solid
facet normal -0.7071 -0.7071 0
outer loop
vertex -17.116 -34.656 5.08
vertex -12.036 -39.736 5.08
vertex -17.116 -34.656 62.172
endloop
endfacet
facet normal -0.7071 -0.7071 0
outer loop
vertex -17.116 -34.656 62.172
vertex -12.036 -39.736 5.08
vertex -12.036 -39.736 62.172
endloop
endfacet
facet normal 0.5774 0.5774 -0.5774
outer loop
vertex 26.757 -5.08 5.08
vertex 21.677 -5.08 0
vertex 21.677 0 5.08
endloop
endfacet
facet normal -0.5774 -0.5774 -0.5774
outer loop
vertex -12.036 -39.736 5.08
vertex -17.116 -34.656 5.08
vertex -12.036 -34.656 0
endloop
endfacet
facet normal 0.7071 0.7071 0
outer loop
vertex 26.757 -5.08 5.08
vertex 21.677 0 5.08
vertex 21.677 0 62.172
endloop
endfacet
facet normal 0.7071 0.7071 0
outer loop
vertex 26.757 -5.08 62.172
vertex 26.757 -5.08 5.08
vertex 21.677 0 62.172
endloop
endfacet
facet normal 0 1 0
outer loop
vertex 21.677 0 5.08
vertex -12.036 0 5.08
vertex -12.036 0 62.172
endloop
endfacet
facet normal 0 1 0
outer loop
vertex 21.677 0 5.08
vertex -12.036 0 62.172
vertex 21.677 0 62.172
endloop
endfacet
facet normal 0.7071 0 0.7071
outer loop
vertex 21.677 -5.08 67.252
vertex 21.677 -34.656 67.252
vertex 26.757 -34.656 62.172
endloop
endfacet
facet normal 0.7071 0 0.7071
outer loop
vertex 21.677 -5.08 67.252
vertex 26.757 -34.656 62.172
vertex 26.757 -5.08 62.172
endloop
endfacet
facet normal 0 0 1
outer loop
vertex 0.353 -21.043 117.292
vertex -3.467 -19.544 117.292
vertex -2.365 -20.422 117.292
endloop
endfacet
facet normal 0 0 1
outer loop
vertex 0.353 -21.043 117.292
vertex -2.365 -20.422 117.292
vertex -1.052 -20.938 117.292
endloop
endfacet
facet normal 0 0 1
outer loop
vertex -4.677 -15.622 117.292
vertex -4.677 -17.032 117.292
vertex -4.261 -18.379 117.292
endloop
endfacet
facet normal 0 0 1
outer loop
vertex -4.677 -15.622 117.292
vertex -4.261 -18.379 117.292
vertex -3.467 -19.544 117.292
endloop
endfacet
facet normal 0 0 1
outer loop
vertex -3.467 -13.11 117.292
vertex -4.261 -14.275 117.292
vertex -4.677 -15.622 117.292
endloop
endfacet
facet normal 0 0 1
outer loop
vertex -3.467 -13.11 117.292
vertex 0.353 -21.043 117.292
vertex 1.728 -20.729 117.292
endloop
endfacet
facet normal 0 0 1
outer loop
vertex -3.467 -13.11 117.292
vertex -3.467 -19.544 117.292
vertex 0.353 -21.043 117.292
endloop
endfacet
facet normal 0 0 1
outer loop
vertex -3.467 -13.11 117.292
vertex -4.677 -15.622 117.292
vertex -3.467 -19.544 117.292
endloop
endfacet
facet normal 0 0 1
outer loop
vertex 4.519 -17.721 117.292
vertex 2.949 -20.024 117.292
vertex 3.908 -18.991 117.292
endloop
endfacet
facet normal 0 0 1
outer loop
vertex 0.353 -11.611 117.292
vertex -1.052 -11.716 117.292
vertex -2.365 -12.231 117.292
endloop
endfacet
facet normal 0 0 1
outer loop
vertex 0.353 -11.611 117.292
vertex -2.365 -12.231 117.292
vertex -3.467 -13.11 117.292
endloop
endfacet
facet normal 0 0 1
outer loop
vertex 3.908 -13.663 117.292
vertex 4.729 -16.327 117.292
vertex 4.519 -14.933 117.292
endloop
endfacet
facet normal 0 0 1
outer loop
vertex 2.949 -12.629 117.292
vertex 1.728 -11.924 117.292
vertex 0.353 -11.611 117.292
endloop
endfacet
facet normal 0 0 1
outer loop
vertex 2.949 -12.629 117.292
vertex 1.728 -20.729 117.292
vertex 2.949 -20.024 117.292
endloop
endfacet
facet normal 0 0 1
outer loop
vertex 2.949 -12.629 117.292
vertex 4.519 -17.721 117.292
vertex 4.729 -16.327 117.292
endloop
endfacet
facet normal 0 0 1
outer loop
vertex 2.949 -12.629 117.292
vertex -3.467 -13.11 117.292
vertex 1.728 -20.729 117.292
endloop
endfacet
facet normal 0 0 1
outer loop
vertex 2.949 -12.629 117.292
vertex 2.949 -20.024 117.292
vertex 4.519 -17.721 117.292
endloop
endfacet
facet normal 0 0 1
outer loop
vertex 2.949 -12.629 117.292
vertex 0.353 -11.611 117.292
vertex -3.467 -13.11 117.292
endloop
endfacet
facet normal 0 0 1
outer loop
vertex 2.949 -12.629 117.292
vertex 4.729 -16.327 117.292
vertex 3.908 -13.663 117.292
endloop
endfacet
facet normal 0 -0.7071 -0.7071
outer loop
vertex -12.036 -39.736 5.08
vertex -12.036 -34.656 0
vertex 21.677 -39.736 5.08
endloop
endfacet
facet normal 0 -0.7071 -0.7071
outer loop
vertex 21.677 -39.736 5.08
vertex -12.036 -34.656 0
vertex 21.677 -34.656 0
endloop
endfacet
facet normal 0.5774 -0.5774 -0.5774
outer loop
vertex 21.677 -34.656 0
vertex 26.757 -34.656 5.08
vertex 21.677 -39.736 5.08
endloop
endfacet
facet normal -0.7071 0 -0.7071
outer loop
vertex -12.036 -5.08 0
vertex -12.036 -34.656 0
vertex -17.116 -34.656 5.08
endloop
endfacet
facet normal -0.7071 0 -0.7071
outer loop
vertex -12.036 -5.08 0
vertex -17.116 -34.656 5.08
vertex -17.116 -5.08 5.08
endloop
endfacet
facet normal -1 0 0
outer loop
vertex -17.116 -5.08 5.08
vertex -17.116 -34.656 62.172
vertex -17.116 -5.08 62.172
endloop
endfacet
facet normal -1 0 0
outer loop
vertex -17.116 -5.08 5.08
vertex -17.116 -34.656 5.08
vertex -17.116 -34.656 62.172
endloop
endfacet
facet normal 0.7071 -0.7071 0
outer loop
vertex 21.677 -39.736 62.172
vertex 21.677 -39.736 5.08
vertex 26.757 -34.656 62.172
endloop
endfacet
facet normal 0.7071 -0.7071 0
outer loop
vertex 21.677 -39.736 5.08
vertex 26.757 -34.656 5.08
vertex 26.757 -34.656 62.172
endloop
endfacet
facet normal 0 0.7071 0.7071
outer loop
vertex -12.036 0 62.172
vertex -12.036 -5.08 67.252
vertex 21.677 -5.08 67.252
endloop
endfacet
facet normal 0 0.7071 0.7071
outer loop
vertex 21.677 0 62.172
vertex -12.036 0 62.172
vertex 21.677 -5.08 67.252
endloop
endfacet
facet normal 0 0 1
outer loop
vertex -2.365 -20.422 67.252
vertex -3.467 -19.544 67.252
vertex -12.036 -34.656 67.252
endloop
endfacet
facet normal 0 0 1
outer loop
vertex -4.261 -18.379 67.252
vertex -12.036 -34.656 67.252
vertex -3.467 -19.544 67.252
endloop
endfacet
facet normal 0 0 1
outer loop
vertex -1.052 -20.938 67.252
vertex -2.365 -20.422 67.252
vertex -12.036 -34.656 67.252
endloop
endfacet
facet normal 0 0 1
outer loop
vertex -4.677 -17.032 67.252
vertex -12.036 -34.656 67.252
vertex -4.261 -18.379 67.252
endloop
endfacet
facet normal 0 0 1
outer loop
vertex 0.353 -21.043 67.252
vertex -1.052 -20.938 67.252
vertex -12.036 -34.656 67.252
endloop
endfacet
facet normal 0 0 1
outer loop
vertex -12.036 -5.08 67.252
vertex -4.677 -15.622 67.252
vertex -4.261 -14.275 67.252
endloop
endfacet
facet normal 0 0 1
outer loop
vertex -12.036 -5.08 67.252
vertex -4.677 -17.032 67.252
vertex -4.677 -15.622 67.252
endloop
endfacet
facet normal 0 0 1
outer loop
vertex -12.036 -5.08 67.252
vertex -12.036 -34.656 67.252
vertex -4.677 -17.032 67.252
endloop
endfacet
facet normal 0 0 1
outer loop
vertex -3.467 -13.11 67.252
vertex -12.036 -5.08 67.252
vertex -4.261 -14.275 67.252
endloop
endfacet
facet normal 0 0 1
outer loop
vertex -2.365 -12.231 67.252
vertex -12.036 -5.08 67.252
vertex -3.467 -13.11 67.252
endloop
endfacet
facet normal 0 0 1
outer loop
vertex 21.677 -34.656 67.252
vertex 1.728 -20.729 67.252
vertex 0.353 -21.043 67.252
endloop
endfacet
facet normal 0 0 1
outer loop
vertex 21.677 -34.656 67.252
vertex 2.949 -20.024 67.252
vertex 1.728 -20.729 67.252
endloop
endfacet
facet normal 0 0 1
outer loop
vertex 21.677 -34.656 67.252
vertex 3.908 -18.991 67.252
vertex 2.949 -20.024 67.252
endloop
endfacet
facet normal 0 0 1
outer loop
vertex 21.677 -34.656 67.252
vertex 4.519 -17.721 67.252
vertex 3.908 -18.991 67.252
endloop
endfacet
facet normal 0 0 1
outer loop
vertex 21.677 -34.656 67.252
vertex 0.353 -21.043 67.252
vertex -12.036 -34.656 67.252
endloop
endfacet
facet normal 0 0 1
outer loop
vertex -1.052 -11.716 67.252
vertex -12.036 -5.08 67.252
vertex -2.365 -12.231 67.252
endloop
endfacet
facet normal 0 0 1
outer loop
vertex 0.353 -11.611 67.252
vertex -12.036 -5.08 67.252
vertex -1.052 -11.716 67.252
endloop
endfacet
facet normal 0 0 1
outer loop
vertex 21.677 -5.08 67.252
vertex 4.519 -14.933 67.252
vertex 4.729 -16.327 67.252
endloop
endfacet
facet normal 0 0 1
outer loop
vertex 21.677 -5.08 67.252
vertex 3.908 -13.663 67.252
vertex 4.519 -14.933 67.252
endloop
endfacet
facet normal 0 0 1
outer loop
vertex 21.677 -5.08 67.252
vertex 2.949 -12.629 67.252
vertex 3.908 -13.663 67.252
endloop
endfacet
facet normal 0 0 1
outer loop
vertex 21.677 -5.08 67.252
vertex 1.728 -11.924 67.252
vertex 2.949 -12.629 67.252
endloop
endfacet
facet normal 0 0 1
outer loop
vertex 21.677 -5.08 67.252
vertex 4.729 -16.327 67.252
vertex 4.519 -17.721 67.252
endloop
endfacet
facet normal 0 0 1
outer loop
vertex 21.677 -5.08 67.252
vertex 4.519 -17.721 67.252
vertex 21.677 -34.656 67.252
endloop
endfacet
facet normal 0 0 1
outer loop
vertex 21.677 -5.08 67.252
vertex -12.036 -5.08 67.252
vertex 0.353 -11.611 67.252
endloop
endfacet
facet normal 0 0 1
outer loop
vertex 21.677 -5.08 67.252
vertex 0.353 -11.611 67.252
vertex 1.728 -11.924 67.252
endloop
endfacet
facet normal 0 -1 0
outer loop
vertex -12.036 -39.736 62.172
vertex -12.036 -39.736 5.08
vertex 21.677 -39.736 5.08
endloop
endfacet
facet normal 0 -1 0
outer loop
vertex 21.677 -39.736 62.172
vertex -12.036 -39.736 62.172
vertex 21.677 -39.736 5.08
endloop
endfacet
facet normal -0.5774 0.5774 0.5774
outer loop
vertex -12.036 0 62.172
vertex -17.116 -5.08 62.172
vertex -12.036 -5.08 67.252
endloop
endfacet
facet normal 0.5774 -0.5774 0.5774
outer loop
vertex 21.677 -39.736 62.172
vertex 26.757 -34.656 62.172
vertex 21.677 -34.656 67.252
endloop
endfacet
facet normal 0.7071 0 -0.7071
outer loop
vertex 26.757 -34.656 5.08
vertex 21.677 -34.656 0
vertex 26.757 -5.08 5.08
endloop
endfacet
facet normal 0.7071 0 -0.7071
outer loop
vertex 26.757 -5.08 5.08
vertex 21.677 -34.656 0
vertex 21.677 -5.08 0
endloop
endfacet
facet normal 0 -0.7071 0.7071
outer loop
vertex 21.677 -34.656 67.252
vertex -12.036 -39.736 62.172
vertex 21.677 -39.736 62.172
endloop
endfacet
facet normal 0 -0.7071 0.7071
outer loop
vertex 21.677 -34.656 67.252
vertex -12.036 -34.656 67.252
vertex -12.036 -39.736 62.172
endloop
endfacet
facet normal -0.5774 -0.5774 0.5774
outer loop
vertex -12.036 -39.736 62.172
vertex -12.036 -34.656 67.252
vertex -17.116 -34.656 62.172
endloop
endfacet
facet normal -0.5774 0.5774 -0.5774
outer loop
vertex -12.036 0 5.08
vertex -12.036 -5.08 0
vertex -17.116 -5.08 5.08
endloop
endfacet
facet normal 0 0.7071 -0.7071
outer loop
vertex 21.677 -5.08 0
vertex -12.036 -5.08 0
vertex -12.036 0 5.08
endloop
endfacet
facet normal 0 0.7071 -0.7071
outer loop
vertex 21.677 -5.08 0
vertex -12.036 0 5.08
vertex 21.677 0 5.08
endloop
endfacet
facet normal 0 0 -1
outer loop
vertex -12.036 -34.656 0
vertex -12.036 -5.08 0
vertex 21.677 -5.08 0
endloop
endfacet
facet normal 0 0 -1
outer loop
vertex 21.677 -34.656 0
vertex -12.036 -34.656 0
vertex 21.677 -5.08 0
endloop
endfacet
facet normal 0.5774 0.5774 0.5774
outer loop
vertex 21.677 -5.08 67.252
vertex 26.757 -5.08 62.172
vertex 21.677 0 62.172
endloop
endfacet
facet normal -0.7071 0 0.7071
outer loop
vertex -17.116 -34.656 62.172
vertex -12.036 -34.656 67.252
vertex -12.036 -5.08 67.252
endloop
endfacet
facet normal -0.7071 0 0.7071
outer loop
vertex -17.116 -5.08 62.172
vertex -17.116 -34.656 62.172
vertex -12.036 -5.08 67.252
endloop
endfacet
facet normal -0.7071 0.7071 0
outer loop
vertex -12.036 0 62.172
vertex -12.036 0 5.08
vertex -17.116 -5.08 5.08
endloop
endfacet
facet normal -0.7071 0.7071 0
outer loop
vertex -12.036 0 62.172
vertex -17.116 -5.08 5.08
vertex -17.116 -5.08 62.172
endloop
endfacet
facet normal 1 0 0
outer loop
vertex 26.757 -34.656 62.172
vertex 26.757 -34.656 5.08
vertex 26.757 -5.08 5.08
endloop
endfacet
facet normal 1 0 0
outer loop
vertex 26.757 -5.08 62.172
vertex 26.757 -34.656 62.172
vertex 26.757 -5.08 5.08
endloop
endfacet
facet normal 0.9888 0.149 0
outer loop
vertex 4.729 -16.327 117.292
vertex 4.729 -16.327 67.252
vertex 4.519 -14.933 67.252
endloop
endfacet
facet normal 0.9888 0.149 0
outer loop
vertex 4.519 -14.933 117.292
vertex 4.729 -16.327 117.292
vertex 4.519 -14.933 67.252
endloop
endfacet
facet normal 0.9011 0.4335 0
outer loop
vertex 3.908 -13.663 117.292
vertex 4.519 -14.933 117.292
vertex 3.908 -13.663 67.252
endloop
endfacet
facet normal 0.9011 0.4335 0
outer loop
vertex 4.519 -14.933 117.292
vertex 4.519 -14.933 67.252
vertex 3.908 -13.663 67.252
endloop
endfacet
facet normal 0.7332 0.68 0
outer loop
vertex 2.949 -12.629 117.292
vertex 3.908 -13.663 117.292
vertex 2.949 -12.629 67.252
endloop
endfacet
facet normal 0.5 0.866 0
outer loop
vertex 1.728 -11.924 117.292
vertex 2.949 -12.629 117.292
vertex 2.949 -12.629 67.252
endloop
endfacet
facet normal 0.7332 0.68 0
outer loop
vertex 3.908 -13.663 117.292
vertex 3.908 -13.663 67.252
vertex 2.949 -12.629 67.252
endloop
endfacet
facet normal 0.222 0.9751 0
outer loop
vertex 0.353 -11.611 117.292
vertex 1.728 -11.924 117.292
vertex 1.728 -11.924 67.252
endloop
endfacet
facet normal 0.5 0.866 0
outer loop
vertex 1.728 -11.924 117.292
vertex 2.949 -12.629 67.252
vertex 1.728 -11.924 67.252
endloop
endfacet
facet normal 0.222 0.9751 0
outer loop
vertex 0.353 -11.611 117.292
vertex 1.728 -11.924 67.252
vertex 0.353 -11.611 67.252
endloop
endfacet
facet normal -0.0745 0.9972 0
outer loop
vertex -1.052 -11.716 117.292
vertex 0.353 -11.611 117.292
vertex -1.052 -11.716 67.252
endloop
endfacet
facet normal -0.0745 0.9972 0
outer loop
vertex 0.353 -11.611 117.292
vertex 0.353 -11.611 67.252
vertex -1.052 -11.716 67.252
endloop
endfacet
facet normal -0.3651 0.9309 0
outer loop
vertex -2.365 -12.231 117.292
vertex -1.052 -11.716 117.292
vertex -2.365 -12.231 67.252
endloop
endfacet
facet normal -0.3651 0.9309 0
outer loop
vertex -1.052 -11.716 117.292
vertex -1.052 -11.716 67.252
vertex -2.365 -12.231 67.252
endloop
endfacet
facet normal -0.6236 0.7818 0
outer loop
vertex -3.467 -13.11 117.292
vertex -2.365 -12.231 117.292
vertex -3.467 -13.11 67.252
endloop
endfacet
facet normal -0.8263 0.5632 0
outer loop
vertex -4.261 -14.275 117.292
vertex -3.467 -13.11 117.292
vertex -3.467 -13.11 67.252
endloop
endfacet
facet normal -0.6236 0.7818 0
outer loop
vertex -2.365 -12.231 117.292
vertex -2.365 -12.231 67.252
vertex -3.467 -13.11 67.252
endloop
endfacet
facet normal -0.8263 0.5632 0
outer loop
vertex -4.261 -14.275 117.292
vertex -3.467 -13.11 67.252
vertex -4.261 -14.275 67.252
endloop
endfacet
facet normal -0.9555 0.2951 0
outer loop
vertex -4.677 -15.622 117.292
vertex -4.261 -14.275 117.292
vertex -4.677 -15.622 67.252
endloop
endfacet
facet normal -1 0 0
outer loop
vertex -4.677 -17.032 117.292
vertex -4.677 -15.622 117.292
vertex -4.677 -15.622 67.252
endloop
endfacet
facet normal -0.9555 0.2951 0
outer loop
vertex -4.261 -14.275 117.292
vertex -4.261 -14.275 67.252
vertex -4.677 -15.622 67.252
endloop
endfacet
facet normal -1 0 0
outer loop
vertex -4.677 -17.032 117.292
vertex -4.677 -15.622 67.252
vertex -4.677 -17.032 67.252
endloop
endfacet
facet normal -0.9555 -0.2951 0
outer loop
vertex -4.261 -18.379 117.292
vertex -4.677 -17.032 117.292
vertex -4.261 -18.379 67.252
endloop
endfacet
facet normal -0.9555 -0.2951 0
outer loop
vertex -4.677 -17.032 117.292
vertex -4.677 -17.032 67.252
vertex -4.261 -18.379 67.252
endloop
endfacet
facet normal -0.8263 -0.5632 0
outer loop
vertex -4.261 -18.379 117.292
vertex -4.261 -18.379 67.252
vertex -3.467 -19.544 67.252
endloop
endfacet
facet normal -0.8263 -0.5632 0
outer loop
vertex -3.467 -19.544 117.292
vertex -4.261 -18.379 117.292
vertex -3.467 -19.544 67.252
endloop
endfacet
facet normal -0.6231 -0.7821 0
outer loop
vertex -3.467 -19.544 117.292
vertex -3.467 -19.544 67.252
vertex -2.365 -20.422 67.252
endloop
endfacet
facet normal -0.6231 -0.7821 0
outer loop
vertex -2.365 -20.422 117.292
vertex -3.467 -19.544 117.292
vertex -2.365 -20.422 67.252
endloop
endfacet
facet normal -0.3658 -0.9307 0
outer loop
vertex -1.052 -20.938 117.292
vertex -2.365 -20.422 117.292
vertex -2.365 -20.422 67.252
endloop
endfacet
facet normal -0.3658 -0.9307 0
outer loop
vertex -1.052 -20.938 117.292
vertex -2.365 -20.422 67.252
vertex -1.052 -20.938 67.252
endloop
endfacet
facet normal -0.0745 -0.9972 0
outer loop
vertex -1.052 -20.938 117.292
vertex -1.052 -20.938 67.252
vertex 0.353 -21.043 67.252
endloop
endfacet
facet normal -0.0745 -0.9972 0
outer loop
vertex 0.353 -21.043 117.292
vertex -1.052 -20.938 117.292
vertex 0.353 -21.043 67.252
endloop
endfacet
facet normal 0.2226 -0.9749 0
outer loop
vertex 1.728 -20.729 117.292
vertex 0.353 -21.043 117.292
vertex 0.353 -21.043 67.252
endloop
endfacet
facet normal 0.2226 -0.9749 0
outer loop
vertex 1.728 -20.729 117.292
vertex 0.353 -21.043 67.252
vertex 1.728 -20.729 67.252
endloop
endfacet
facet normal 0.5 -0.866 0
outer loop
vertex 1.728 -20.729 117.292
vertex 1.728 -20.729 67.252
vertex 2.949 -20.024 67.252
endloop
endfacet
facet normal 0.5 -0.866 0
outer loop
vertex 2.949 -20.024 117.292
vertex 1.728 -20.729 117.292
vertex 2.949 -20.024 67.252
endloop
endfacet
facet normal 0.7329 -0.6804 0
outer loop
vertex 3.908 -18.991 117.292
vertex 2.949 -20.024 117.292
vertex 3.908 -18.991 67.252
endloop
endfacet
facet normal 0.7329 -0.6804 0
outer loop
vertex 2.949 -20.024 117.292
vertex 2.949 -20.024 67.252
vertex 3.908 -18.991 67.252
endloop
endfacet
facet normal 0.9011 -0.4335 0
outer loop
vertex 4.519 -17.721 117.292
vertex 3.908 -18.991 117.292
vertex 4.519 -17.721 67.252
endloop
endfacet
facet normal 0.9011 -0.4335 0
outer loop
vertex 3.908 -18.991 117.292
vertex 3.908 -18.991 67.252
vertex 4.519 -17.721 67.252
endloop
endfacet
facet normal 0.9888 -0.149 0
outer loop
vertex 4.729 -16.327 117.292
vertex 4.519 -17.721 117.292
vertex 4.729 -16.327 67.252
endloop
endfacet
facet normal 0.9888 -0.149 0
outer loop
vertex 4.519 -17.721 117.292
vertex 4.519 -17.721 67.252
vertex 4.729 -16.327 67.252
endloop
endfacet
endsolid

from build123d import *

# Parameters (mm, degrees)
F0_W     = 43.873566
F0_H     = 39.735638
F1_DEPTH = 67.251692
F2_SIZE  = 5.08
F3_R     = 4.729386
F4_DEPTH = 50.0404


with BuildPart() as f1:
    # F0 (on Top) → F1 (new body)
    with BuildSketch(Plane.XY):
        with Locations((4.820467, -19.867819)):
            Rectangle(F0_W, F0_H)
    extrude(amount=F1_DEPTH)

    # F2
    f2_edges = [f1.edges().sort_by_distance(p)[0] for p in [
        (26.75725, -39.735638, 33.625846),
        (26.75725, -19.867819, 67.251692),
        (4.820467, -39.735638, 67.251692),
        (-17.116316, -19.867819, 67.251692),
        (-17.116316, -39.735638, 33.625846),
        (-17.116316, -19.867819, 0),
        (26.75725, -19.867819, 0),
        (4.820467, 0, 0),
        (26.75725, 0, 33.625846),
        (-17.116316, 0, 33.625846),
        (4.820467, 0, 67.251692),
        (4.820467, -39.735638, 0),
    ]]
    chamfer(f2_edges, length=F2_SIZE)

    # F3 (on face) → F4 (join)
    with BuildSketch(Plane.XY.offset(67.251692)):
        with Locations((0, -16.326718)):
            Circle(F3_R)
    extrude(amount=F4_DEPTH)


solid = f1.part
